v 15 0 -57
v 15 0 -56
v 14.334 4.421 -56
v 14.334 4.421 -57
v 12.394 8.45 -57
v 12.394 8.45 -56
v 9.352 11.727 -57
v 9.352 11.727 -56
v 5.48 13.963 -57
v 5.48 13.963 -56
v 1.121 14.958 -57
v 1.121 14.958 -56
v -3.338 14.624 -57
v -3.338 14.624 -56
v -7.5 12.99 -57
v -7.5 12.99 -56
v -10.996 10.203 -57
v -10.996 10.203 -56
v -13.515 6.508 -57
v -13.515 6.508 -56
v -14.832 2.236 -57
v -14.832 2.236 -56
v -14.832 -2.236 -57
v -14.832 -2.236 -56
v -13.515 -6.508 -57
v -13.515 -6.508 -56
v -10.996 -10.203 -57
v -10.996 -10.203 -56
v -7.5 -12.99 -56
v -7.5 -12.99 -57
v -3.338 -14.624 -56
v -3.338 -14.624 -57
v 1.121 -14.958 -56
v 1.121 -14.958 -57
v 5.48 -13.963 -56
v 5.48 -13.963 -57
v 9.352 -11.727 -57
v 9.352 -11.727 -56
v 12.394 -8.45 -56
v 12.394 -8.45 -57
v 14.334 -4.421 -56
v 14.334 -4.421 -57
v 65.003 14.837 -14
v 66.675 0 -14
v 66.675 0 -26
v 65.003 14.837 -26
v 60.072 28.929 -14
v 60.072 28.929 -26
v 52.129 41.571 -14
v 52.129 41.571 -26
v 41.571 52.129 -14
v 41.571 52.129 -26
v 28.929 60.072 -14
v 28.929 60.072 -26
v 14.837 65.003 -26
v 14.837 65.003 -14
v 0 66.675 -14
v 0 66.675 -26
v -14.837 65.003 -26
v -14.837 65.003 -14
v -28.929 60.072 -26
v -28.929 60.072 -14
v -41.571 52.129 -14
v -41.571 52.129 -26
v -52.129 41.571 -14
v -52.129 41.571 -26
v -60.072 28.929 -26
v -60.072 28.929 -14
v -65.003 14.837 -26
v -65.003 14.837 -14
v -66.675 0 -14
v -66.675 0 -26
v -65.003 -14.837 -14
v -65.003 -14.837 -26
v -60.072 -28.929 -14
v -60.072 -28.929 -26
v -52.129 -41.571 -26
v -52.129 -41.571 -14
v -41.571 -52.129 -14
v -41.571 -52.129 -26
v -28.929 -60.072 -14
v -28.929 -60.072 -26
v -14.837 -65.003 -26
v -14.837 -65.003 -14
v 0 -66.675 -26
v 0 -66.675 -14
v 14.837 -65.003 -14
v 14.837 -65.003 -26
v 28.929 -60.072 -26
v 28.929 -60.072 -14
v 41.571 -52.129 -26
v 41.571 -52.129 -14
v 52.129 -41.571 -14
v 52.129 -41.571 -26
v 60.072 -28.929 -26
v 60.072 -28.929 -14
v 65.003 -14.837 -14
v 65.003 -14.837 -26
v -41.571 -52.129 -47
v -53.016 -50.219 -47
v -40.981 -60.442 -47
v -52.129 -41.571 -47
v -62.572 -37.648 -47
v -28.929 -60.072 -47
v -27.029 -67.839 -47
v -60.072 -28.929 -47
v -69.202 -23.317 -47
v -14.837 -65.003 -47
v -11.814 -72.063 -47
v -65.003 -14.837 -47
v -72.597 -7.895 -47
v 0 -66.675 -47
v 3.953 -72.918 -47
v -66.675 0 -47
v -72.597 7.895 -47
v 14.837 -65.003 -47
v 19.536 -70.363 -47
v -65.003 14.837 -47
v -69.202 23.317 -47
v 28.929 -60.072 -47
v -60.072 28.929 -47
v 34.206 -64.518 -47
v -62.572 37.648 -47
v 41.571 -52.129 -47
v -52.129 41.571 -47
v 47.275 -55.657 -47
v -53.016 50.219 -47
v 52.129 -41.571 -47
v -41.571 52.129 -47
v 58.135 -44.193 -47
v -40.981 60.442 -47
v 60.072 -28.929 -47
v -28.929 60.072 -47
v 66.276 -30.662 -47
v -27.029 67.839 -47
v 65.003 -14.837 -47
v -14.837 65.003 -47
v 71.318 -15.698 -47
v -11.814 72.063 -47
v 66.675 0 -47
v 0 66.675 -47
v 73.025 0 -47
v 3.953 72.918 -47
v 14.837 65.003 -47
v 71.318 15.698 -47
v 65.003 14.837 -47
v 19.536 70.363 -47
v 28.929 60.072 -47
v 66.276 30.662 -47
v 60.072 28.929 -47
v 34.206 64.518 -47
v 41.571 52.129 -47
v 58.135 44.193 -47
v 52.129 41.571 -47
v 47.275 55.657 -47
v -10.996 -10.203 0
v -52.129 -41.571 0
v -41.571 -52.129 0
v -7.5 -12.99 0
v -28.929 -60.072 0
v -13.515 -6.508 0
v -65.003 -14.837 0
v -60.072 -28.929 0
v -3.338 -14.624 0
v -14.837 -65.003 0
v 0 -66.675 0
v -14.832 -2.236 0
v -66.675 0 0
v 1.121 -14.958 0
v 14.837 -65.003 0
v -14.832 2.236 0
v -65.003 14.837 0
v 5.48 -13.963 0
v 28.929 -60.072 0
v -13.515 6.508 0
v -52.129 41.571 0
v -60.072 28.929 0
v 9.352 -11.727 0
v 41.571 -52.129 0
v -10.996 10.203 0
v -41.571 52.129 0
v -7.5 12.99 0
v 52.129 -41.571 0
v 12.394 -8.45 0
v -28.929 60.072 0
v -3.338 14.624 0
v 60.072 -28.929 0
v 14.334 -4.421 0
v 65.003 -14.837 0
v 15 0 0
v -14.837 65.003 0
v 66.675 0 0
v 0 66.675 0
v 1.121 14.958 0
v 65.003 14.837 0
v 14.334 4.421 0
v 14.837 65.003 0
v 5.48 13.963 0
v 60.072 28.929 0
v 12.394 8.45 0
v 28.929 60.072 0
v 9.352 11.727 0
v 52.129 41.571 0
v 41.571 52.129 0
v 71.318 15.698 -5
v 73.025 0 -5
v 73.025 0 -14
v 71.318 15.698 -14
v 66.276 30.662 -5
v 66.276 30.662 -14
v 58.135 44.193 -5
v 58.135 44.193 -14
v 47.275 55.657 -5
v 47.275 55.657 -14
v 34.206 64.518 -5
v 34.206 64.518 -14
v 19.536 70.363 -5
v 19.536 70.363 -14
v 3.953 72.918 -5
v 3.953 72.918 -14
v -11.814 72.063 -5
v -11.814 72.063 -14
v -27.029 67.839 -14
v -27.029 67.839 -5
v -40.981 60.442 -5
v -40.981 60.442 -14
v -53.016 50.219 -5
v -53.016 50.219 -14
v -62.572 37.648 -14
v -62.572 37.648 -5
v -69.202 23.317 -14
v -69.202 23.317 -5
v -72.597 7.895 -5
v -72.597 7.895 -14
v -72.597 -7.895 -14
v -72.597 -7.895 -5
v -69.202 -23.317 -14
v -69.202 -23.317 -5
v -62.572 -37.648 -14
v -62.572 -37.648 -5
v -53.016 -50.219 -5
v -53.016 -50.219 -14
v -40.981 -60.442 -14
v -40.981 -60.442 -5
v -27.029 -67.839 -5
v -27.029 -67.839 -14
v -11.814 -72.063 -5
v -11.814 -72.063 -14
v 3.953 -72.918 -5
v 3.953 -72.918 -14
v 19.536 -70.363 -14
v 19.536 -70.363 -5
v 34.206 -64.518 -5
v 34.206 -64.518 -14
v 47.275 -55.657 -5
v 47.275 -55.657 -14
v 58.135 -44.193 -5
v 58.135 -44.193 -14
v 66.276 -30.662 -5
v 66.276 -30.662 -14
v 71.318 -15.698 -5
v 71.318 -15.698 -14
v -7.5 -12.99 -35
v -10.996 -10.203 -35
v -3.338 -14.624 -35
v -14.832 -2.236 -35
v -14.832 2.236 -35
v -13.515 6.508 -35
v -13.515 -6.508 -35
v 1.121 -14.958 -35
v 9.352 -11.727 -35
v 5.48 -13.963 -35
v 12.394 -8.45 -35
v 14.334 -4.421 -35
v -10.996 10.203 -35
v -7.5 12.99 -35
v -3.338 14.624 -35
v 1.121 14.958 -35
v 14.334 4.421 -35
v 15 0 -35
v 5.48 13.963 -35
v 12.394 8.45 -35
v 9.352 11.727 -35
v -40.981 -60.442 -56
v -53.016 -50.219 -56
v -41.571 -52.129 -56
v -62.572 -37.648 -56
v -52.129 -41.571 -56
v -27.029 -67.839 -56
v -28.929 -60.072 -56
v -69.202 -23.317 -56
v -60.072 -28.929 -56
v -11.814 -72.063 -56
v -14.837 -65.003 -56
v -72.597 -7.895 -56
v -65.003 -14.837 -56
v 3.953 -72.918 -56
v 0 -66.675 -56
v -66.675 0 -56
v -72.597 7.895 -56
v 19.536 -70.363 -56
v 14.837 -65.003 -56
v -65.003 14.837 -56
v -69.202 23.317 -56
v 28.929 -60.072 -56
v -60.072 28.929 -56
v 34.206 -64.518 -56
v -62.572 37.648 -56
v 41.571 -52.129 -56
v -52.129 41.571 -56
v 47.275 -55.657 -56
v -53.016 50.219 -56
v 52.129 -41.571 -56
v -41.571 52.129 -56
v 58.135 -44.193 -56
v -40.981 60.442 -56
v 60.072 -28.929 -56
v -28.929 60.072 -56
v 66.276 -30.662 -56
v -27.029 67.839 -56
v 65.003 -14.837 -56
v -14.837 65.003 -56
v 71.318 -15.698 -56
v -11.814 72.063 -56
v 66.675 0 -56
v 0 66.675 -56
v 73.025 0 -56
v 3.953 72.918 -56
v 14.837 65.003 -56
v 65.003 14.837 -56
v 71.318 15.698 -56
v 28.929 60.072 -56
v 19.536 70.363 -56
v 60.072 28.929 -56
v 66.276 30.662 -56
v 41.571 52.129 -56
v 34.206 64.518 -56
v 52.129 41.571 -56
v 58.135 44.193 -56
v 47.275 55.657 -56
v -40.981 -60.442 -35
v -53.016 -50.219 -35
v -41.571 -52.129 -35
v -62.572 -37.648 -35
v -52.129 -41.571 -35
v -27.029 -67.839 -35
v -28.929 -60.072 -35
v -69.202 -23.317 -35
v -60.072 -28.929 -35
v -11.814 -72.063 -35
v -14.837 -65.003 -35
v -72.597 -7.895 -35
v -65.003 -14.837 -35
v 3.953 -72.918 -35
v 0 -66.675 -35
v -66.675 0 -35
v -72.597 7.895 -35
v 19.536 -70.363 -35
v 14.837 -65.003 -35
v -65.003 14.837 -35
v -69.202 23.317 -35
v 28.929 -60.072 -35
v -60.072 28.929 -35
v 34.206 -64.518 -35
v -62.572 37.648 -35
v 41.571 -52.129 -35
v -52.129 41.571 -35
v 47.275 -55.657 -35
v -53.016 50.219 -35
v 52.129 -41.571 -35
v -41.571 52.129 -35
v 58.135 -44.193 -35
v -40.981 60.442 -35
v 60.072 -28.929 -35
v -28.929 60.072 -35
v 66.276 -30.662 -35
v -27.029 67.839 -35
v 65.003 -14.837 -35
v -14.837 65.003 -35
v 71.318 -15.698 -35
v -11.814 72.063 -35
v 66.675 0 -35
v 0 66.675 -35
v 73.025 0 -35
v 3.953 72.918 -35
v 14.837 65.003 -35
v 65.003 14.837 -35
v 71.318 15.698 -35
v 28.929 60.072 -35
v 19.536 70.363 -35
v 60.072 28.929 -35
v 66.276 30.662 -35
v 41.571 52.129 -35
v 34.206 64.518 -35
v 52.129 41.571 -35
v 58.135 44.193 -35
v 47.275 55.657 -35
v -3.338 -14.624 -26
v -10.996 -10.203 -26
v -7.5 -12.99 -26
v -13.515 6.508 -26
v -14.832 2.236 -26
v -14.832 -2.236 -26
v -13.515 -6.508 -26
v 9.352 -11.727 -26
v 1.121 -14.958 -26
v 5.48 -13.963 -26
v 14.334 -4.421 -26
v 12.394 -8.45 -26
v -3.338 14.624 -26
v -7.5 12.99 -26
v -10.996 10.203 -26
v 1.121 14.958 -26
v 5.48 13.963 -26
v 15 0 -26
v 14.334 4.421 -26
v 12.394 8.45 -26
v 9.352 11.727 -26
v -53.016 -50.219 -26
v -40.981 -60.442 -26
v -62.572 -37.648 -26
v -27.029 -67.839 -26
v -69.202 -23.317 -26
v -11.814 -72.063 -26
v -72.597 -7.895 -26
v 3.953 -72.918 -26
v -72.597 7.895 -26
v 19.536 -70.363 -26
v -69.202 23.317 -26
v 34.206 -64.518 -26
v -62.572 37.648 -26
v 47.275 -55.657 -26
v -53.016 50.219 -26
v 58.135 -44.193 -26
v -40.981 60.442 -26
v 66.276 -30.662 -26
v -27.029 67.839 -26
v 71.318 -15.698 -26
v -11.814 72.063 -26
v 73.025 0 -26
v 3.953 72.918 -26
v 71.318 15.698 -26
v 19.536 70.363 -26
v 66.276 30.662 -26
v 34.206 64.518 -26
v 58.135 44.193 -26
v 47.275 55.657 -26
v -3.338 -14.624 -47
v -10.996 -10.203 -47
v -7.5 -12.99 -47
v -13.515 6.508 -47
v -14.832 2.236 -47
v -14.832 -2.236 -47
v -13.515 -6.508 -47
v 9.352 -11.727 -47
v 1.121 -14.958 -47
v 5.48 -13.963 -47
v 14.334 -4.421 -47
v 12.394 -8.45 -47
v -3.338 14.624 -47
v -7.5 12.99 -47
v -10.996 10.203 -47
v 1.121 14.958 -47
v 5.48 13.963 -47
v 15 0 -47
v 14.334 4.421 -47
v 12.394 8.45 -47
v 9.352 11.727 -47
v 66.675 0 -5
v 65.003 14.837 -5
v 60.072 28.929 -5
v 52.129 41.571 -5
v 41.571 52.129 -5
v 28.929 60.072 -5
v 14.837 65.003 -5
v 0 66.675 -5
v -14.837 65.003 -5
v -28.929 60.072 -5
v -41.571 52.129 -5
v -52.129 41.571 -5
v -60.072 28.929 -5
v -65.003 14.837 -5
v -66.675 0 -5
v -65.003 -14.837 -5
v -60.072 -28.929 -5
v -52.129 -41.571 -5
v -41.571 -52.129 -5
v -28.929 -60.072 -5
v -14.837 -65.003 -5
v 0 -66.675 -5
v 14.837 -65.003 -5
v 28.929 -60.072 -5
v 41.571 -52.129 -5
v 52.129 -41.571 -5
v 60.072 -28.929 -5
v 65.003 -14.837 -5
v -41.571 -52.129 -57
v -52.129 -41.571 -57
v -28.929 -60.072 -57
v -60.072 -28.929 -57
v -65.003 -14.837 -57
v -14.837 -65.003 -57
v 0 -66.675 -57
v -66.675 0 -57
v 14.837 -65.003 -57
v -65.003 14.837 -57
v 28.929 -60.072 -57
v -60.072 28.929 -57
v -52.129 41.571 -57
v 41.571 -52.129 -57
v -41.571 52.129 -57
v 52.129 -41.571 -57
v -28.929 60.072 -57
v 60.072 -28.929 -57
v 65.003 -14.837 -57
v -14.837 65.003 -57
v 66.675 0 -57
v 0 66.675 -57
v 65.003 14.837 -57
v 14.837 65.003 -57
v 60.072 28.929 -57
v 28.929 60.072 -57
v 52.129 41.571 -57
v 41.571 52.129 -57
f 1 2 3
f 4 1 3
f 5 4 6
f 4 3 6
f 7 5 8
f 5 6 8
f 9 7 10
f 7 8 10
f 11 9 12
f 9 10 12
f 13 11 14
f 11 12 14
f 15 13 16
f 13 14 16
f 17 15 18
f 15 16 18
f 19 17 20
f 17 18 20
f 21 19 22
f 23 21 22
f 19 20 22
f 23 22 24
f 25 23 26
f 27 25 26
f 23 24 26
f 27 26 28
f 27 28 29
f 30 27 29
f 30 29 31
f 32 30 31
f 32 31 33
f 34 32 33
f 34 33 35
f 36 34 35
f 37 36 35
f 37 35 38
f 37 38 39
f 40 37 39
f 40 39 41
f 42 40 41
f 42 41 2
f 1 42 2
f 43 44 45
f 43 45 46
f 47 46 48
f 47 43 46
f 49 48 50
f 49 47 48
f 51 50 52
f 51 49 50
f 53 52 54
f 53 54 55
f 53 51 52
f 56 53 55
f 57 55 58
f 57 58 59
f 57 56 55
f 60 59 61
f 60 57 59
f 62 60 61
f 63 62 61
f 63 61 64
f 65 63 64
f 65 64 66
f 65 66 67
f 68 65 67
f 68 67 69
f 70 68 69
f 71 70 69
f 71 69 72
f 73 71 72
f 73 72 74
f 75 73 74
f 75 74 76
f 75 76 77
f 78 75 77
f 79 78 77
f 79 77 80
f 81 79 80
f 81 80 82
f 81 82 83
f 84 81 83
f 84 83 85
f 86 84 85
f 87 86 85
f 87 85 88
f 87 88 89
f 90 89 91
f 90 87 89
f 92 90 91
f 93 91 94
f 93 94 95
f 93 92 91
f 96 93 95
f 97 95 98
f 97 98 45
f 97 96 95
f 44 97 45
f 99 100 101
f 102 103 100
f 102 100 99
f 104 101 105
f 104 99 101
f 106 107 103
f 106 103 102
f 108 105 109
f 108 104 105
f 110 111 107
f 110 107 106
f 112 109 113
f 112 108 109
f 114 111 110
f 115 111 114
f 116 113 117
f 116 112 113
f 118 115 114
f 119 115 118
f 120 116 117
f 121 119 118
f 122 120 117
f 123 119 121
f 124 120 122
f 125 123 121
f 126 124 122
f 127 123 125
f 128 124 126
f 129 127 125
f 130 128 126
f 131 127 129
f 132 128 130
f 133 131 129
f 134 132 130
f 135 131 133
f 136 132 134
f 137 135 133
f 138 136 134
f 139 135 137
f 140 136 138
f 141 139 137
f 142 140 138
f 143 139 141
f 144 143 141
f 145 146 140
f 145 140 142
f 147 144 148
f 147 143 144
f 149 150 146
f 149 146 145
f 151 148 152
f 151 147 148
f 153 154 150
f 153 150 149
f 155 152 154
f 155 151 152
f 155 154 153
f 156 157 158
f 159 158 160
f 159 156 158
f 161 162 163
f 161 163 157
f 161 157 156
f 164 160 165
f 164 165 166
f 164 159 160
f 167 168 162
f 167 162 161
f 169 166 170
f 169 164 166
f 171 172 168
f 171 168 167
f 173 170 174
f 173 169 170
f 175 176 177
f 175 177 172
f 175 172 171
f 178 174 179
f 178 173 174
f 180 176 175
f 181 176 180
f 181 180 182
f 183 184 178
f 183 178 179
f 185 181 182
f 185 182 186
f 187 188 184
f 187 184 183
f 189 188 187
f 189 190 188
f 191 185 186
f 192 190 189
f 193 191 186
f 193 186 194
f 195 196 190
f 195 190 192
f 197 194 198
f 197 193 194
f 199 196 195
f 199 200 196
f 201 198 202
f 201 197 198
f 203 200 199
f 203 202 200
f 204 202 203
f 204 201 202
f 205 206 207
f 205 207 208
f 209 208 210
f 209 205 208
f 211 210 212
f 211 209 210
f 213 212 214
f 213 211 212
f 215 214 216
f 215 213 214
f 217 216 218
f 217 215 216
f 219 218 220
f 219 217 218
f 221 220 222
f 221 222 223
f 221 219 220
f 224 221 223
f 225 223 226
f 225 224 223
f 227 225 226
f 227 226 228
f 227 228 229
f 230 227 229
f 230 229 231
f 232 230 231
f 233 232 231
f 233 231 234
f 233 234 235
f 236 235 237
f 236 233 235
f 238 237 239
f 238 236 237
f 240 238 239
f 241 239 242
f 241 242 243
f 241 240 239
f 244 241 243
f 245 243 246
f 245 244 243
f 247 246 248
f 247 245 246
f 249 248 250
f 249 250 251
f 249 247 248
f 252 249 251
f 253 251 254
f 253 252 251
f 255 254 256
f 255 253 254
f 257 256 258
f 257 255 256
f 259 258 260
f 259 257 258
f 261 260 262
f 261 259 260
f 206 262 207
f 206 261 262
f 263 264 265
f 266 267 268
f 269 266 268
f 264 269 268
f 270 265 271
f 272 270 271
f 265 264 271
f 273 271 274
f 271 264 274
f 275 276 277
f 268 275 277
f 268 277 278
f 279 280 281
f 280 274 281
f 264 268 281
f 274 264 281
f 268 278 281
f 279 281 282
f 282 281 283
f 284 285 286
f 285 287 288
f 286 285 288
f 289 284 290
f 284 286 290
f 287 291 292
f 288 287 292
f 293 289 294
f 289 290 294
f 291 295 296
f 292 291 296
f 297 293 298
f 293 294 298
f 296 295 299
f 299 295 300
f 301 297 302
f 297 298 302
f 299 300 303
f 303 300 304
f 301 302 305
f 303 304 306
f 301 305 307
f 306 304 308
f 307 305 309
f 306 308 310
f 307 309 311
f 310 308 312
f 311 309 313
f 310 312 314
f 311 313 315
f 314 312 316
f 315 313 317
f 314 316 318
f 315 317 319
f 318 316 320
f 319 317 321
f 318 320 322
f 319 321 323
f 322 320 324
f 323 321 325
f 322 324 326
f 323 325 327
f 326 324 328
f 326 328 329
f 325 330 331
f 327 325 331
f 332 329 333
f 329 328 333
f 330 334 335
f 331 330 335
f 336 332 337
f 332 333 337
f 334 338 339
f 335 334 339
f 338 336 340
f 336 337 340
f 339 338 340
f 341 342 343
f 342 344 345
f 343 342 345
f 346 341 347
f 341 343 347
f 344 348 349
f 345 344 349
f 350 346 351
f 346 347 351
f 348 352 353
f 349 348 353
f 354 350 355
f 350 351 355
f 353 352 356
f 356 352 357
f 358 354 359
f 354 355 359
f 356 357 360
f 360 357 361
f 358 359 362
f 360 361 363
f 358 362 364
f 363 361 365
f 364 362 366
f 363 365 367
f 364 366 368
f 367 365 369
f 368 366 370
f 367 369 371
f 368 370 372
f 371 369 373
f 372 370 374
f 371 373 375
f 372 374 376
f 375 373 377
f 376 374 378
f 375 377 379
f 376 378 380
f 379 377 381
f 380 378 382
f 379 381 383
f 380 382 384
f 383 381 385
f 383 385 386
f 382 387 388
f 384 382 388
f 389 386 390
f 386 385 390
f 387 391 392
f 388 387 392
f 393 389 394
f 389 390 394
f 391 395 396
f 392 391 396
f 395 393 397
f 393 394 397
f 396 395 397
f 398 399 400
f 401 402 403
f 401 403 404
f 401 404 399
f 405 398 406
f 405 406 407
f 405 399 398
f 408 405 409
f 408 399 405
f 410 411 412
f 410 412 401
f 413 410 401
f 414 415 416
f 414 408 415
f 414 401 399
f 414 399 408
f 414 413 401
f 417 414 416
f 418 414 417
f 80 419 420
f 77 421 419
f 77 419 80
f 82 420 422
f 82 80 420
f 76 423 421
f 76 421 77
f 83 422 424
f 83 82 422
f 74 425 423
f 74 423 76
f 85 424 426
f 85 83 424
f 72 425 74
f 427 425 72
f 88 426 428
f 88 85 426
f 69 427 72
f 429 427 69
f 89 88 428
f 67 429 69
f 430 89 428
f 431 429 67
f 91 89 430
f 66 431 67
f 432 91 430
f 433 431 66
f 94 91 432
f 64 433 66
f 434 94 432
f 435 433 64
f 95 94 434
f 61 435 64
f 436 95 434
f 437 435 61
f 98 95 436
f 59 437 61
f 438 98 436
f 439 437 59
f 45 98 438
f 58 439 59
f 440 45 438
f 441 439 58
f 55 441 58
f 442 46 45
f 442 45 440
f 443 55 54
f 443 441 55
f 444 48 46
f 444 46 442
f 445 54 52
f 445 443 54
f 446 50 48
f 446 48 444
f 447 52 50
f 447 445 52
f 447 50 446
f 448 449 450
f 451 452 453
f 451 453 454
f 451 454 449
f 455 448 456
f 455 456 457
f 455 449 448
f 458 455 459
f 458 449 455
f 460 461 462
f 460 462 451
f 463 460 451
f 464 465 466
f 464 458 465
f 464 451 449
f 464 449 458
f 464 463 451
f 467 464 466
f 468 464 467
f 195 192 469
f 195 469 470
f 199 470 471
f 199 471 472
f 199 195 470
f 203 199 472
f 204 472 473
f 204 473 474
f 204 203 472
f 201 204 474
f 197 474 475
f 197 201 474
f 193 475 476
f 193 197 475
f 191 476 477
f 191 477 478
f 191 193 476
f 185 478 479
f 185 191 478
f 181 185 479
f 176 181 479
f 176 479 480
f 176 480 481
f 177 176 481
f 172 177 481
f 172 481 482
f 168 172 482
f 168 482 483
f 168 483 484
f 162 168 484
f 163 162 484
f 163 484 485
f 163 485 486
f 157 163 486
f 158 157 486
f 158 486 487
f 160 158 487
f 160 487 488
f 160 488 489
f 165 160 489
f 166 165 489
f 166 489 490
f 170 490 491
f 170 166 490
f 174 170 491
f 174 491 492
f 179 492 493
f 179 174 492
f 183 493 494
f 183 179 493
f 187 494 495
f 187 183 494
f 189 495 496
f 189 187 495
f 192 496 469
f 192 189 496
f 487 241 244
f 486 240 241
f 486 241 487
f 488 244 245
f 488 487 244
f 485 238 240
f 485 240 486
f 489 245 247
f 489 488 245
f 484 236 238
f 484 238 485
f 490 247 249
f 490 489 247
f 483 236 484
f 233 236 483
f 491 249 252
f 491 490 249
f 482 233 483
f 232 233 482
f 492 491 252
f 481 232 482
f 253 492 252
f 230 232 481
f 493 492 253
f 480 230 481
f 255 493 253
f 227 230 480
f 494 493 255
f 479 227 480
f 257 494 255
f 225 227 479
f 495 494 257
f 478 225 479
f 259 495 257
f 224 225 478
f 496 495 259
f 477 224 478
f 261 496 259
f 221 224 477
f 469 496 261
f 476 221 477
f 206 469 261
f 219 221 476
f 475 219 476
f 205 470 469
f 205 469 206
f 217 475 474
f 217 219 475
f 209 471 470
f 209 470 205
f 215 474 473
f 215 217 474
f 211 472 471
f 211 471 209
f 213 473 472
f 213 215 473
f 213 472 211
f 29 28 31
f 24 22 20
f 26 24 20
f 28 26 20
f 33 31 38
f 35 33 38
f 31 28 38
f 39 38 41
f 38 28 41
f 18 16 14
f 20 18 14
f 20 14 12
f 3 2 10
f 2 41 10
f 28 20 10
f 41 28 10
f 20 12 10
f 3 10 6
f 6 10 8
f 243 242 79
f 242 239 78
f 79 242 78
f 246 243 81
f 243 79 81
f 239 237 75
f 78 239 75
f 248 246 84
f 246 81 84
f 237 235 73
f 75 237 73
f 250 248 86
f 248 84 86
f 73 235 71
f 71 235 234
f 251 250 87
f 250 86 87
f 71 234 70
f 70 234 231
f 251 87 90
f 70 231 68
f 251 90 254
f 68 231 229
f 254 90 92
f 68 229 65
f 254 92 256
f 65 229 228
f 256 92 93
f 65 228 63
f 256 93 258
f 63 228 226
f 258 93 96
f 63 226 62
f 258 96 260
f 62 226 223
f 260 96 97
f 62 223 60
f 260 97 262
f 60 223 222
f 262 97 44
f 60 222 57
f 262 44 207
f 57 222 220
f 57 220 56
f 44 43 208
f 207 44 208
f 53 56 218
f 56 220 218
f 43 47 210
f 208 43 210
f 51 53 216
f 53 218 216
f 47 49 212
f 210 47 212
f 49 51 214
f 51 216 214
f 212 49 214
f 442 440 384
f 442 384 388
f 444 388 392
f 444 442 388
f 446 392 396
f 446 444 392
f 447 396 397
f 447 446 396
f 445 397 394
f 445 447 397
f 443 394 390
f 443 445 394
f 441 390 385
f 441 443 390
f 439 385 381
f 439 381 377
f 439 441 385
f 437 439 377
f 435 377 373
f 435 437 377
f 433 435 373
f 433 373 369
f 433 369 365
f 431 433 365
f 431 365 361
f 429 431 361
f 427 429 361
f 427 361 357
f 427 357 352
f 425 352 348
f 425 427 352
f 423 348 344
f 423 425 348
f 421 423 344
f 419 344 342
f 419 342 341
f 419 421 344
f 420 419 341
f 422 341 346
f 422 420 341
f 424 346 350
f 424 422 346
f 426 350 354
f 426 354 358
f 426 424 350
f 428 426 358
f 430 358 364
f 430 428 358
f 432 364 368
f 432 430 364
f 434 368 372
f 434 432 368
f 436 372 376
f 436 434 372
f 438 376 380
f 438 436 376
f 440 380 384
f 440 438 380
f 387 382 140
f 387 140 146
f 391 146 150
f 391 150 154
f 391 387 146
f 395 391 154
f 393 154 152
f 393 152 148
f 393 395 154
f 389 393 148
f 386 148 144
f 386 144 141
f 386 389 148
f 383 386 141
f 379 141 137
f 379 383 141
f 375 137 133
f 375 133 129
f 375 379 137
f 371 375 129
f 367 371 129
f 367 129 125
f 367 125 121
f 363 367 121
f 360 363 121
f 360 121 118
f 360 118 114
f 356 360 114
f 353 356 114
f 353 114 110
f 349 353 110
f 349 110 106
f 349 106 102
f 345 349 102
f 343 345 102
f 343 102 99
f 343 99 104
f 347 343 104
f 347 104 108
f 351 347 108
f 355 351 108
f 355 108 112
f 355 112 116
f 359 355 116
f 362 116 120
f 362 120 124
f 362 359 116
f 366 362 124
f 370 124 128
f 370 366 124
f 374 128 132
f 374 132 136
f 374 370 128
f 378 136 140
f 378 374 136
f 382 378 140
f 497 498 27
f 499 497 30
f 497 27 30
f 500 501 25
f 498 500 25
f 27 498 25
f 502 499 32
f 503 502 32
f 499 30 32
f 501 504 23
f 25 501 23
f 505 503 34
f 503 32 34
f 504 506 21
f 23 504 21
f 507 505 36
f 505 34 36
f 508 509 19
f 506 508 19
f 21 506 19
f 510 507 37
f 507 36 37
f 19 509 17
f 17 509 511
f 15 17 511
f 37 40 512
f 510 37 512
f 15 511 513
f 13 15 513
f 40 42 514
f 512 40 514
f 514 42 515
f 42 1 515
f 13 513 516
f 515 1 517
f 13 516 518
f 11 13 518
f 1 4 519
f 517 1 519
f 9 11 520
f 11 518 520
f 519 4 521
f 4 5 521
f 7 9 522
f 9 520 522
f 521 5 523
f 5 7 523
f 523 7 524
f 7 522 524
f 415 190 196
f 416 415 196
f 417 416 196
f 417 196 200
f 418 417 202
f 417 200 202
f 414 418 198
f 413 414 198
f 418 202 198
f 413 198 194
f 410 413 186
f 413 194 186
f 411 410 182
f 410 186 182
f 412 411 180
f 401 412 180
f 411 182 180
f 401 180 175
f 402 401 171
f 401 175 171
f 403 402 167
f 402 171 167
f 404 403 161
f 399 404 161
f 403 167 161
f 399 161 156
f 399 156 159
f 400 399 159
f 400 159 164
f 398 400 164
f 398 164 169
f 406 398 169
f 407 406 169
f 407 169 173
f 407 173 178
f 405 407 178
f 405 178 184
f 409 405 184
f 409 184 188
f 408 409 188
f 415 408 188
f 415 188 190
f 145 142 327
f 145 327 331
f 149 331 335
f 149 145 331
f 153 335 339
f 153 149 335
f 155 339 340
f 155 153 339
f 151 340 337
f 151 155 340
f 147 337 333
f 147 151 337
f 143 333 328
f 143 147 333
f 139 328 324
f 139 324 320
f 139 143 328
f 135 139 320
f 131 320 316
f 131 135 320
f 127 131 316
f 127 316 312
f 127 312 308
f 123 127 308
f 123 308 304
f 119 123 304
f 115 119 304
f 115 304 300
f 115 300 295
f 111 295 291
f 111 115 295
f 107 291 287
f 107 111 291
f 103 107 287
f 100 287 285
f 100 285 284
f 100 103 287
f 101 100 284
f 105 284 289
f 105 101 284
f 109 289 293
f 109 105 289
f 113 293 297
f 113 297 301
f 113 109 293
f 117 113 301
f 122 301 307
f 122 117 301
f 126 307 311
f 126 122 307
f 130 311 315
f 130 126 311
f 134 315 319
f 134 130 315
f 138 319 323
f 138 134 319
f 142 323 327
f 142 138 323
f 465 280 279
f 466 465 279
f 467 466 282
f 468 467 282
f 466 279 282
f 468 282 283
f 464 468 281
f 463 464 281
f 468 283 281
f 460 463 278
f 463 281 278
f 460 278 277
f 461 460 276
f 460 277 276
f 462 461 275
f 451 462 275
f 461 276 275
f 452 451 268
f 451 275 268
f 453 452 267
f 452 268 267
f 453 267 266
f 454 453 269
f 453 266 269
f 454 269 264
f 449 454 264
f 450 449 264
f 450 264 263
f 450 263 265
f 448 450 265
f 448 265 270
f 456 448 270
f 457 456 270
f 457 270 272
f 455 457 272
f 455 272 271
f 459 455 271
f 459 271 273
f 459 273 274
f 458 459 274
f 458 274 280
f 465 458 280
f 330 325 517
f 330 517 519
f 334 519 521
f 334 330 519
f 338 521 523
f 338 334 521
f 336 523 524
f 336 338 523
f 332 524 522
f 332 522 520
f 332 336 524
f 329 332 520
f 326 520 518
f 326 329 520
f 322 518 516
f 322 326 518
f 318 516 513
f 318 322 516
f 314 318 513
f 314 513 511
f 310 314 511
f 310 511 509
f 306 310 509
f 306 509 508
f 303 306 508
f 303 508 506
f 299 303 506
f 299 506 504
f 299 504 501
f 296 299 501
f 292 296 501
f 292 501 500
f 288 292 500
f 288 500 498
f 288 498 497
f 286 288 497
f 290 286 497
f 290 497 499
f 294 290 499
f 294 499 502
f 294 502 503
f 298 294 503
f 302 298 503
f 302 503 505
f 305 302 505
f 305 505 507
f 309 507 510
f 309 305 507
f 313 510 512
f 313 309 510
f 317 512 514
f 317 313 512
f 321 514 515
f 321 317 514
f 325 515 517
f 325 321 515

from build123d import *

# Parameters (mm, degrees)
SKETCH1_R           = 66.675
SKETCH1_R_2         = 15
BOSS_EXTRUDE1_DEPTH = 57
SKETCH2_R           = 73.025
BOSS_EXTRUDE2_DEPTH = 9
SKETCH5_R           = 15
CUT_EXTRUDE1_DEPTH  = 116.625694593
LPATTERN3_COUNT     = 3
LPATTERN3_PITCH     = 21


with BuildPart() as part:
    # Sketch1 → Boss-Extrude1 (new body)
    with BuildSketch(Plane.XY):
        Circle(SKETCH1_R)
        Circle(SKETCH1_R_2, mode=Mode.SUBTRACT)
    extrude(amount=-BOSS_EXTRUDE1_DEPTH)

    # Sketch2 → Boss-Extrude2 (add)
    with BuildSketch(Plane.XY.offset(-5)):
        Circle(SKETCH2_R)
    boss_extrude2 = extrude(amount=-BOSS_EXTRUDE2_DEPTH)

    # Sketch5 → Cut-Extrude1 (cut, through all)
    with BuildSketch(Plane.XY.offset(-5)):
        Circle(SKETCH5_R)
    extrude(amount=-CUT_EXTRUDE1_DEPTH, mode=Mode.SUBTRACT)

    # LPattern3: Boss-Extrude2 ×3
    with Locations(*[(0, 0, -i * LPATTERN3_PITCH) for i in range(1, LPATTERN3_COUNT)]):
        add(boss_extrude2)


solid = part.part
